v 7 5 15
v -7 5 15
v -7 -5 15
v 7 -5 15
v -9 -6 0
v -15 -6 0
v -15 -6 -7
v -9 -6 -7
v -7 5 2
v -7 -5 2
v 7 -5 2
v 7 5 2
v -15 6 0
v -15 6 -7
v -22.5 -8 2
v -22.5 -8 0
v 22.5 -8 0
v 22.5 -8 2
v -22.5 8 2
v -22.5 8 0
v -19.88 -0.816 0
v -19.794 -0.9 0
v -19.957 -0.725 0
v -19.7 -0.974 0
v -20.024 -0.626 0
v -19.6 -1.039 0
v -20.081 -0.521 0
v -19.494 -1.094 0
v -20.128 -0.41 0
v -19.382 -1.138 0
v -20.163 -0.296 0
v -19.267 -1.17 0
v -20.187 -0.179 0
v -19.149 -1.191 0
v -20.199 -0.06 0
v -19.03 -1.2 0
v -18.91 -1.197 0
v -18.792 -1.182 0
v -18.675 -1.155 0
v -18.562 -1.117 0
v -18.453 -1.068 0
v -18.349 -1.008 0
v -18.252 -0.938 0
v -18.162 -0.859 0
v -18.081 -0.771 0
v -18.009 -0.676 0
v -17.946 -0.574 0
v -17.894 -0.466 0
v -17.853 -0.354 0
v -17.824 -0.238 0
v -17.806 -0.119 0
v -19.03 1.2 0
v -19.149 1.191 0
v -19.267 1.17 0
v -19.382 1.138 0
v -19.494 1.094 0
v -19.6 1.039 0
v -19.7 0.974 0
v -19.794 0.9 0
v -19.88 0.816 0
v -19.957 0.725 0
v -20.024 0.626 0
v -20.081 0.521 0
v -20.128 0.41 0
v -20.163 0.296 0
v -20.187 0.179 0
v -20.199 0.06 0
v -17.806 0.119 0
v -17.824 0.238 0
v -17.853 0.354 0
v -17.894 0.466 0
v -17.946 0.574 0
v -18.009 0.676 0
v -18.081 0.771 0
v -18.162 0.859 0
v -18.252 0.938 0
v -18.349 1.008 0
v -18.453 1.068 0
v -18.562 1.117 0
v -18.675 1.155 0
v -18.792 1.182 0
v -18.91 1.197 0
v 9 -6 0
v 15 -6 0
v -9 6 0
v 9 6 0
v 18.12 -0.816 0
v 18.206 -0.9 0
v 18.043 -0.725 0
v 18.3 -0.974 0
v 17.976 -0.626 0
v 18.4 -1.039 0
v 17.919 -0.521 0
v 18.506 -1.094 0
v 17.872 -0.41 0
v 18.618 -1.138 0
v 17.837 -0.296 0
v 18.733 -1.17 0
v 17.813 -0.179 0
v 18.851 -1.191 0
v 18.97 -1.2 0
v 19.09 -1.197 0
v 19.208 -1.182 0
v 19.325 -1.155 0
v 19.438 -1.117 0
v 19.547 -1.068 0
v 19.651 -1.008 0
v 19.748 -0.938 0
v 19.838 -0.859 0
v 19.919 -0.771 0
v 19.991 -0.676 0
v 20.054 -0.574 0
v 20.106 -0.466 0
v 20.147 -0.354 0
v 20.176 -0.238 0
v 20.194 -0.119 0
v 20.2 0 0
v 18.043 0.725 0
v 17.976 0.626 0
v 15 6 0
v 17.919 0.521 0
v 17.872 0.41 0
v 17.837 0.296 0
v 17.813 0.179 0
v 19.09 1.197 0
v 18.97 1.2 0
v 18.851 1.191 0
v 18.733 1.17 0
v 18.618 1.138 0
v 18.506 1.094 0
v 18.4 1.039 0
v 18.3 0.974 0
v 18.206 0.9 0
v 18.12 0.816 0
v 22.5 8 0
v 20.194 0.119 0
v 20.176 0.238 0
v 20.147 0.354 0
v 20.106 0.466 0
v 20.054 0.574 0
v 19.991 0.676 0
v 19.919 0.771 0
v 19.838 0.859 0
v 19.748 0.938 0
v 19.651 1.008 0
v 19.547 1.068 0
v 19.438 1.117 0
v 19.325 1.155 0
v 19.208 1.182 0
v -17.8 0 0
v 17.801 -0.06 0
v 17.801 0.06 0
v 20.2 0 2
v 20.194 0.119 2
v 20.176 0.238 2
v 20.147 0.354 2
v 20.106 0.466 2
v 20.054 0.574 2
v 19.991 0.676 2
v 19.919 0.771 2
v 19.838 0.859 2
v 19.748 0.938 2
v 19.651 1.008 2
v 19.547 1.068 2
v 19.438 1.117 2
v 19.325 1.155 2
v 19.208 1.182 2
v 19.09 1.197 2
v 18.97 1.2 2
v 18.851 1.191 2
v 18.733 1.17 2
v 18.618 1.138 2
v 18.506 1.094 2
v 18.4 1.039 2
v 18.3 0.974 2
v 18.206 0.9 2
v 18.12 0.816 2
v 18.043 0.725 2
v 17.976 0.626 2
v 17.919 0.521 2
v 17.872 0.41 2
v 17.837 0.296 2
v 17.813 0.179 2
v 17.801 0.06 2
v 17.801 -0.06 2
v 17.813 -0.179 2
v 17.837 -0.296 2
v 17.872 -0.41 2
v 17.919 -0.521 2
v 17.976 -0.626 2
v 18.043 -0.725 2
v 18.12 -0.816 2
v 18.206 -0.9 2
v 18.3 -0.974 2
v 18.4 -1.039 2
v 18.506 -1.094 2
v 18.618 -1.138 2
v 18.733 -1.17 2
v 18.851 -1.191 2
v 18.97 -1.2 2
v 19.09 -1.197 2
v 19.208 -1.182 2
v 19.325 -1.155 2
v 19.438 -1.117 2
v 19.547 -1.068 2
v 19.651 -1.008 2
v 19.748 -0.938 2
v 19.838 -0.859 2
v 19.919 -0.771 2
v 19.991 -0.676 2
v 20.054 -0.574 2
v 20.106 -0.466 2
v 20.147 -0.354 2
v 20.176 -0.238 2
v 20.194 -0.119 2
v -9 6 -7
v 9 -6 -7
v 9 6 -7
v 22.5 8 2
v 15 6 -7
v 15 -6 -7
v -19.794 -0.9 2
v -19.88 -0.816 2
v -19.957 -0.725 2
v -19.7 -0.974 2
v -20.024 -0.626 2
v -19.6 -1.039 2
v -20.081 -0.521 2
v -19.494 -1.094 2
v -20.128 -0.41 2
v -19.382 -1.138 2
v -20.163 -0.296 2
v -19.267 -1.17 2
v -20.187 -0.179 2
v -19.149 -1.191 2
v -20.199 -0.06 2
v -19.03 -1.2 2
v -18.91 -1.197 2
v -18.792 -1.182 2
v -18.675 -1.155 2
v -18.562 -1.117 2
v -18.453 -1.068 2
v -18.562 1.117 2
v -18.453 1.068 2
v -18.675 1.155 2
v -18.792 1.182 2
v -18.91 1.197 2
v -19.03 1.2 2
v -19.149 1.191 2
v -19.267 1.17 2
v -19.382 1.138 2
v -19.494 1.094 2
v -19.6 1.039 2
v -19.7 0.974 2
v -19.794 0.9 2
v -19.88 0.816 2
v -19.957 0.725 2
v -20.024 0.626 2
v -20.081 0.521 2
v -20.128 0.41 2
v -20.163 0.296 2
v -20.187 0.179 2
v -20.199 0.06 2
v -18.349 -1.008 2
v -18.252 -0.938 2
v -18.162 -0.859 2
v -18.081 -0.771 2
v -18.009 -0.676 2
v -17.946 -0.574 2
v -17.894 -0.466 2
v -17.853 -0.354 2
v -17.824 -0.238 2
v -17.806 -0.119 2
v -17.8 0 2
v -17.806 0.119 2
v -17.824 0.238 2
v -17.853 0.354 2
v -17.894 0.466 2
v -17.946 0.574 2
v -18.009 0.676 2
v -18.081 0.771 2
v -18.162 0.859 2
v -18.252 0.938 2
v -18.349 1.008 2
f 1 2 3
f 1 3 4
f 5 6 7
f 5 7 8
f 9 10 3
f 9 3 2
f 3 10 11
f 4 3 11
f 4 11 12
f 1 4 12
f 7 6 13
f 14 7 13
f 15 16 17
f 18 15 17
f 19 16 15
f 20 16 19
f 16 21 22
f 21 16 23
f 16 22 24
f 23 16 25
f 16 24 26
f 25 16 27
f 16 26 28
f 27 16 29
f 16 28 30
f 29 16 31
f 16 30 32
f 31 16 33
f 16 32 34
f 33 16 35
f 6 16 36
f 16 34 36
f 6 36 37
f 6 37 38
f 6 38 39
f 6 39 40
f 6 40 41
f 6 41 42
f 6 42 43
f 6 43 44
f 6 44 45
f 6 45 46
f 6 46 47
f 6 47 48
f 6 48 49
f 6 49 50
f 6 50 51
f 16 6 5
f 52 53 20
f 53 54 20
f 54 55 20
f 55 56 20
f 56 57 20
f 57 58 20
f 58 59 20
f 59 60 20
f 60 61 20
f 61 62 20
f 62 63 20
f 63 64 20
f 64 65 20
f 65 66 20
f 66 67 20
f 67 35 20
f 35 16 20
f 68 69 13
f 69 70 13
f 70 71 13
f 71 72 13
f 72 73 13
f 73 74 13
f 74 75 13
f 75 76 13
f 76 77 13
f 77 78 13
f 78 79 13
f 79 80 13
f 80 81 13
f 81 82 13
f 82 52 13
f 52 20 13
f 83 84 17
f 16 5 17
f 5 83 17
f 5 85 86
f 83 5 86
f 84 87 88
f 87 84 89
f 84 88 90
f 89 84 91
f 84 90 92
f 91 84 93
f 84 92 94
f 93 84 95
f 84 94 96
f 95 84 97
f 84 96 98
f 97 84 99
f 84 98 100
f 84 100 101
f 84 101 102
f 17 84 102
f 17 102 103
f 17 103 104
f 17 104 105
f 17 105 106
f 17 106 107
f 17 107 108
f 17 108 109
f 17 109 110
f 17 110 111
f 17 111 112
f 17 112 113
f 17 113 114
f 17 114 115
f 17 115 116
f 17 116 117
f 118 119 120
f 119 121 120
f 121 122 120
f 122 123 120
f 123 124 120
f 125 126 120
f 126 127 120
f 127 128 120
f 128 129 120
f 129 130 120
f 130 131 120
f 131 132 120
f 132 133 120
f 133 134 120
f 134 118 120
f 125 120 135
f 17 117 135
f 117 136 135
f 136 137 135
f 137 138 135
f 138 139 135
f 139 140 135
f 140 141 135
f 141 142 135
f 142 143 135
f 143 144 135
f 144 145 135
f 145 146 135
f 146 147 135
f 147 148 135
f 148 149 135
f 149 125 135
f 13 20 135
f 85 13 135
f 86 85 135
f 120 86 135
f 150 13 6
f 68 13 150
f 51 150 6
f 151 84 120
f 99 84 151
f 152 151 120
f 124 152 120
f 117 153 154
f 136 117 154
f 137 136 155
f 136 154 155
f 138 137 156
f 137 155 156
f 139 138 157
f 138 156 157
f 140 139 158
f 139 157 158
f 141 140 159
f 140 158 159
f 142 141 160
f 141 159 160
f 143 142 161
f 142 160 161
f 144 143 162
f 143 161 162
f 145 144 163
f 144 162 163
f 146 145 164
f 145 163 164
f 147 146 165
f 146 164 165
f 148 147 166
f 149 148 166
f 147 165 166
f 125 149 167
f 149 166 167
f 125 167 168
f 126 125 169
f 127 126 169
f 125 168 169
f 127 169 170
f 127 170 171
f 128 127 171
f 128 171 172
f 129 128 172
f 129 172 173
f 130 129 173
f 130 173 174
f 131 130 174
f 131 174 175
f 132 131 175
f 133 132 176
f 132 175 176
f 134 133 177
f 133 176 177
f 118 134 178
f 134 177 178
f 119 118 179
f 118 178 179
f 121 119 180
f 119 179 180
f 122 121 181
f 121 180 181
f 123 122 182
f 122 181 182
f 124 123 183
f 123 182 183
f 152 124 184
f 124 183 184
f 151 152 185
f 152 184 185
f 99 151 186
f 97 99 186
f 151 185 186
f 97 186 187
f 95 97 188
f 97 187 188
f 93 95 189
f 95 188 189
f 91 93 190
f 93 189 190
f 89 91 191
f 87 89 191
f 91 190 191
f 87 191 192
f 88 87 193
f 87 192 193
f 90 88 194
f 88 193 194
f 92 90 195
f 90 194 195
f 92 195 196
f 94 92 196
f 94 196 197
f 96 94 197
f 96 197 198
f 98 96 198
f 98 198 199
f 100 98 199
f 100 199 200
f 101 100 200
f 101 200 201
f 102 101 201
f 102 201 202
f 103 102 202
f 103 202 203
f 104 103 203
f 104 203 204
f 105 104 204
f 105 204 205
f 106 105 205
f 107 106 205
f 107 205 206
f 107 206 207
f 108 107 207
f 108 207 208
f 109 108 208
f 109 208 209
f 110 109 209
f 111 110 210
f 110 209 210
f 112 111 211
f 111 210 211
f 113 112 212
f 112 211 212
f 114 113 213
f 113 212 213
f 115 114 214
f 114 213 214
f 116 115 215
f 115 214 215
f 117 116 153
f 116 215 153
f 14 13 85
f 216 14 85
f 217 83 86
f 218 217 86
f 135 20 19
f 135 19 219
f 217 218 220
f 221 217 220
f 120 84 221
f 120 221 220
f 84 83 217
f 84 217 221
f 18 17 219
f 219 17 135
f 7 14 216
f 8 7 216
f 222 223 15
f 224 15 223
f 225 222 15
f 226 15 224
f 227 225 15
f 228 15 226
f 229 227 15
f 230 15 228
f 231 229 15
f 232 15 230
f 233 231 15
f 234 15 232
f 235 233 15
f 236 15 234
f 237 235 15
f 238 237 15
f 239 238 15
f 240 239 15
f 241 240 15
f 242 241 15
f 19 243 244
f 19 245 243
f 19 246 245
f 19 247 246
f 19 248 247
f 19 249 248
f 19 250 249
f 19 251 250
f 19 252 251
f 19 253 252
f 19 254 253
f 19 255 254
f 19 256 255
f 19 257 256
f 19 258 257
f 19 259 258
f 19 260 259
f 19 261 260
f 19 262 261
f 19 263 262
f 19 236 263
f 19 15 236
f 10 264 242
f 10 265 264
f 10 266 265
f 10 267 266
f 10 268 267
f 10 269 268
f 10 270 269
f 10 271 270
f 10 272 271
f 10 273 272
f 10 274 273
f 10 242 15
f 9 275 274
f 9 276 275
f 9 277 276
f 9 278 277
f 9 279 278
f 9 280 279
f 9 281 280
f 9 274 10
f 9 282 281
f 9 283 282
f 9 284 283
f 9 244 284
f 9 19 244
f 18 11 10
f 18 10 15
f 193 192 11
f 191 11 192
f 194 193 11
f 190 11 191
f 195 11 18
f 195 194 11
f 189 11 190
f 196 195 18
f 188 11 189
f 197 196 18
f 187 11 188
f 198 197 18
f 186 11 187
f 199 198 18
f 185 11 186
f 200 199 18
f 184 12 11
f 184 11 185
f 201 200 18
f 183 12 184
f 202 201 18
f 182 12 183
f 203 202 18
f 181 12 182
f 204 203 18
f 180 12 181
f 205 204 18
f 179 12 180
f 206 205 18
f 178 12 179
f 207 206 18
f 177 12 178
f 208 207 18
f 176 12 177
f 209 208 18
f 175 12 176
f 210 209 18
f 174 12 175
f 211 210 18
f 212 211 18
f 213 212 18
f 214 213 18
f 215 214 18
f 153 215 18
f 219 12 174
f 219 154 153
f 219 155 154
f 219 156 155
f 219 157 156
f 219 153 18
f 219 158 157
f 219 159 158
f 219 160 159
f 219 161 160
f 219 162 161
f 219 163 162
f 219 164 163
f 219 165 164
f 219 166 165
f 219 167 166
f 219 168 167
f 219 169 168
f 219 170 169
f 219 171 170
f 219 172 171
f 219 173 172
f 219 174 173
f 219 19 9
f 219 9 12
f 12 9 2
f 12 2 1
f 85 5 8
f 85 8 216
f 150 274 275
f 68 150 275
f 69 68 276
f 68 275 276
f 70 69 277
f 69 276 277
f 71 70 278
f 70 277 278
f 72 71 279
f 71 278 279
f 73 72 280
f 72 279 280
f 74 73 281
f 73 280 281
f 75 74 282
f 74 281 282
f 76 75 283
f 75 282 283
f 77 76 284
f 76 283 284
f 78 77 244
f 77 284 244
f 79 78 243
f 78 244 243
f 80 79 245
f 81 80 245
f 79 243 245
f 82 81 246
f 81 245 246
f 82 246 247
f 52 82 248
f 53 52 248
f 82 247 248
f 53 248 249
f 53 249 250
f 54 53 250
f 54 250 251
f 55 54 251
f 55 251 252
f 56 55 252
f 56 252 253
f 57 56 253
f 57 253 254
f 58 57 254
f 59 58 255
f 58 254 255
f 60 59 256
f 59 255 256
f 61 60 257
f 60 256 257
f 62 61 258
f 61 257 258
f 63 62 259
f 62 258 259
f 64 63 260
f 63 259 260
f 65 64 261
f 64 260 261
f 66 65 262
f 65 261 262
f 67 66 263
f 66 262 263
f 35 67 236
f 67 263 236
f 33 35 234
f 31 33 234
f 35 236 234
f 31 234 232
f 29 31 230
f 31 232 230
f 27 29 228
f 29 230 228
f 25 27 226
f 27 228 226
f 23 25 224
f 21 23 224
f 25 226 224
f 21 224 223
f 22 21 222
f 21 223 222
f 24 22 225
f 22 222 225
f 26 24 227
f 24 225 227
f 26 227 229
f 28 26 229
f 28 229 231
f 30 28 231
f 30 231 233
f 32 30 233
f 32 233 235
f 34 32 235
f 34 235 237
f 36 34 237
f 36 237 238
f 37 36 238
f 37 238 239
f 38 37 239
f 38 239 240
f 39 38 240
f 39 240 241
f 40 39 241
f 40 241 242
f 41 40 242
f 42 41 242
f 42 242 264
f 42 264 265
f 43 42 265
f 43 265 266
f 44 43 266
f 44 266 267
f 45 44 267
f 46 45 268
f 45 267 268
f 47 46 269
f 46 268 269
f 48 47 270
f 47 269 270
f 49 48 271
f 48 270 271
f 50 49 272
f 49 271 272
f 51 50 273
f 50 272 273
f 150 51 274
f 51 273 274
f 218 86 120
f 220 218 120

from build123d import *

# Parameters (mm, degrees)
SKETCH_1_W          = 45
SKETCH_1_H          = 16
EXTRUDE_1_DEPTH     = 2
SKETCH_2_R          = 1.2
CUT_EXTRUDE_1_DEPTH = 2
SKETCH_3_W          = 14
SKETCH_3_H          = 10
EXTRUDE_2_DEPTH     = 13
SKETCH_4_W          = 6
SKETCH_4_H          = 12
EXTRUDE_3_DEPTH     = 9


with BuildPart() as part:
    # ｽｹｯﾁ1 → ﾎﾞｽ - 押し出し1 (new body)
    with BuildSketch(Plane.XY):
        Rectangle(SKETCH_1_W, SKETCH_1_H)
    extrude(amount=EXTRUDE_1_DEPTH)

    # ｽｹｯﾁ2 → ｶｯﾄ - 押し出し1 (cut)
    with BuildSketch(Plane.XY.offset(2)):
        with Locations((-19, 0)):
            Circle(SKETCH_2_R)
        with Locations((19, 0)):
            Circle(SKETCH_2_R)
    extrude(amount=-CUT_EXTRUDE_1_DEPTH, mode=Mode.SUBTRACT)

    # ｽｹｯﾁ3 → ﾎﾞｽ - 押し出し2 (add)
    with BuildSketch(Plane.XY.offset(2)):
        Rectangle(SKETCH_3_W, SKETCH_3_H)
    extrude(amount=EXTRUDE_2_DEPTH)

    # ｽｹｯﾁ4 → ﾎﾞｽ - 押し出し3 (add)
    with BuildSketch(Plane.XY.offset(2)):
        with Locations((-12, 0)):
            Rectangle(SKETCH_4_W, SKETCH_4_H)
        with Locations((12, 0)):
            Rectangle(SKETCH_4_W, SKETCH_4_H)
    extrude(amount=-EXTRUDE_3_DEPTH)


solid = part.part
